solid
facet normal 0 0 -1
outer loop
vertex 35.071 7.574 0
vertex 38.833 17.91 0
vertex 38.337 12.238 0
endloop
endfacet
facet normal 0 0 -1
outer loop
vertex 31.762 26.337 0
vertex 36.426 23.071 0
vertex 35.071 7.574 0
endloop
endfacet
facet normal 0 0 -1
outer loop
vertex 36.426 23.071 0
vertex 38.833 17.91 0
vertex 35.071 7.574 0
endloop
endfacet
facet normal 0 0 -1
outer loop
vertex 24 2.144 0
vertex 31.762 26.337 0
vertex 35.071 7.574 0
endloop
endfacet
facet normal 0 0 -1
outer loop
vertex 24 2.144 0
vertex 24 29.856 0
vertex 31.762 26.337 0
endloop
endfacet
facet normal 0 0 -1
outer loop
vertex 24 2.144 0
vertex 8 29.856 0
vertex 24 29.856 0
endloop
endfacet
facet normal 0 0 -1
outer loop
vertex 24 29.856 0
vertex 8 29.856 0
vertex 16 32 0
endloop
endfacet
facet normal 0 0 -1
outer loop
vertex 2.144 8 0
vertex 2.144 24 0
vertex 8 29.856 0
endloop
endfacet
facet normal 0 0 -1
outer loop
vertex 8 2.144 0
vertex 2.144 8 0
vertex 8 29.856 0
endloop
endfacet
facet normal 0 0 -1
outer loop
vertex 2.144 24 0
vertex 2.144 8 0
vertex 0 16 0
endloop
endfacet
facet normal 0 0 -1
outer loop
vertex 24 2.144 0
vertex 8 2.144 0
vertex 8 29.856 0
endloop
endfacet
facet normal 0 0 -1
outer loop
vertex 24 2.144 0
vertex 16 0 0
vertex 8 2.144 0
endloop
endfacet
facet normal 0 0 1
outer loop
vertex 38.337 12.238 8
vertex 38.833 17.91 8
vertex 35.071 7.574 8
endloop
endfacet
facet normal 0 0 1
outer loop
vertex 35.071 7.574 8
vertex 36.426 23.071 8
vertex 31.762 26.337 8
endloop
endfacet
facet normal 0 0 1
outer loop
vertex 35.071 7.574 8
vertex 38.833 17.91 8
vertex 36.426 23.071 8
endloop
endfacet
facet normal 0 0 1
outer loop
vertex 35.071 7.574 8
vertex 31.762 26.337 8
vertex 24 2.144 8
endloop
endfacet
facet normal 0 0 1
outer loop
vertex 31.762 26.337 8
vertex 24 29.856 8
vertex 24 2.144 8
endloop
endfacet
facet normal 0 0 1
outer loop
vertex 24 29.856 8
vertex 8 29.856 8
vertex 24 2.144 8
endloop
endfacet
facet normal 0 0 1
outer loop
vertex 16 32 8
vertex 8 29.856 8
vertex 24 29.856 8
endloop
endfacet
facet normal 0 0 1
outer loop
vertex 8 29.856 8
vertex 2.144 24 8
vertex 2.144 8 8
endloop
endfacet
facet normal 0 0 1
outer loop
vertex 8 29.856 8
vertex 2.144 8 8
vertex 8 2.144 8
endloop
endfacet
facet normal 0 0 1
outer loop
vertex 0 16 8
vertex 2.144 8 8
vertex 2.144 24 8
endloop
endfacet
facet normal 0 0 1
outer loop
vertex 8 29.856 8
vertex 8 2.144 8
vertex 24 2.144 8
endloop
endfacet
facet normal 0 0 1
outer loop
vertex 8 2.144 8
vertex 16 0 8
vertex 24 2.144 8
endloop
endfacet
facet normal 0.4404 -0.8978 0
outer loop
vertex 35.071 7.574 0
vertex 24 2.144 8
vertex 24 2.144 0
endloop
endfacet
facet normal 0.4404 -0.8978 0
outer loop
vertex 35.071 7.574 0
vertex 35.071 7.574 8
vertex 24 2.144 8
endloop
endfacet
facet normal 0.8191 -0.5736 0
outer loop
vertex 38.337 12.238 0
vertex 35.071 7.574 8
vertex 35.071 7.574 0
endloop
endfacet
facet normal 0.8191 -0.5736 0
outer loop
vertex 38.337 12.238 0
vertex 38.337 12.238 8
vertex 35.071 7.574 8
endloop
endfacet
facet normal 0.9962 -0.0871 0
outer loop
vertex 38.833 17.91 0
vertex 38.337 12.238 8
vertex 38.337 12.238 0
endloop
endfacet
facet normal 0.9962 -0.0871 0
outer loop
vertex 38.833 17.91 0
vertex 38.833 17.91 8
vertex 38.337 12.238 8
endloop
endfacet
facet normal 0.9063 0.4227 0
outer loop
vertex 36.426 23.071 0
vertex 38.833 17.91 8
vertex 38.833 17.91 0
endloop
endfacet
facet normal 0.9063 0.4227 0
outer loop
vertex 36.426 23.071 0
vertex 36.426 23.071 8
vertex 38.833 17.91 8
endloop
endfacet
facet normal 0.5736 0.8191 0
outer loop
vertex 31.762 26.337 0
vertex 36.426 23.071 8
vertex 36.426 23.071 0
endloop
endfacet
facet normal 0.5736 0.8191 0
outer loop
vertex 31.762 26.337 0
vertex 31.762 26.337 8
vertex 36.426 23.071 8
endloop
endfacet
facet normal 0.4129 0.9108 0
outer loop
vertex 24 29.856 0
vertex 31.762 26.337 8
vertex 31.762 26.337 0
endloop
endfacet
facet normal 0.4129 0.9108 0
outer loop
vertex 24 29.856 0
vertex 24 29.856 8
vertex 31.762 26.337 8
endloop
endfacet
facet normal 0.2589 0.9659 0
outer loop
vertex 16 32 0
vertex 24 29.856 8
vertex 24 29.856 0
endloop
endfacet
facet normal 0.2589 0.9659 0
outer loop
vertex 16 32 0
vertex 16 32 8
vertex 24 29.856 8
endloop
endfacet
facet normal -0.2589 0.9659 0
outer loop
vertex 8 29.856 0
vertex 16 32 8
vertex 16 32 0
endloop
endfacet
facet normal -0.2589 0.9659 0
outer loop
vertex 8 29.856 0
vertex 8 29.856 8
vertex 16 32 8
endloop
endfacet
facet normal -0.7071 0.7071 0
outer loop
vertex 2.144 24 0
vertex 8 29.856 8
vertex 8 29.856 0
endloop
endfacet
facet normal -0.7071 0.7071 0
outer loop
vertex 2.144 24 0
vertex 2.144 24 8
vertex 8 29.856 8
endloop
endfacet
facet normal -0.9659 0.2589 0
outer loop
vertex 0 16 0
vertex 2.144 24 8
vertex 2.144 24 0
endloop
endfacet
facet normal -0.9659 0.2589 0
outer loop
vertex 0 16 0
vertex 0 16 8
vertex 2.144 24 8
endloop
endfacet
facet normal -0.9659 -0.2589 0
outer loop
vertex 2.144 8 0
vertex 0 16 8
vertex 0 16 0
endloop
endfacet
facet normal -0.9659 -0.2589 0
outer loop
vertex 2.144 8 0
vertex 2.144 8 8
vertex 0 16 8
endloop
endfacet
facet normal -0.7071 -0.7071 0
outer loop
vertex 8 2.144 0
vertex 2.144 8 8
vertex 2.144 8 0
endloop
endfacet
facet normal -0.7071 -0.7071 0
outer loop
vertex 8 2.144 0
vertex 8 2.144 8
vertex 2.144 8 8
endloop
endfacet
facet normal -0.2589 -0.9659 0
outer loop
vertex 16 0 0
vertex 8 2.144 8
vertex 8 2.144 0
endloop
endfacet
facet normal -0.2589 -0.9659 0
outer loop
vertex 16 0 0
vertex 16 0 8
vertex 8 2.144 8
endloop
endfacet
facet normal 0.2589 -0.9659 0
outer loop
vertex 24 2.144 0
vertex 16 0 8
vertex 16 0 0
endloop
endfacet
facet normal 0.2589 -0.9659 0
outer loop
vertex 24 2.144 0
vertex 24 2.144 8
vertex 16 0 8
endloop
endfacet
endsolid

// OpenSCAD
$fn = 32;

// ----------------------------------------------------------------------
// Eccentric disc: step, 8 mm thick
// ----------------------------------------------------------------------

// --- parameters (mm) ---
profile_height = 8;       // extrusion height
profile_points = 14;      // points of the closed outline

profile = [[0, 16], [2.144, 8], [8, 2.144], [16, 0], [24, 2.144], [35.071, 7.574], [38.337, 12.238], [38.833, 17.91], [36.426, 23.071], [31.762, 26.337], [24, 29.856], [16, 32], [8, 29.856], [2.144, 24]];  // single closed polygon, 14 points, counter clockwise

// --- the one profile operation ---
linear_extrude(height = profile_height) polygon(points = profile);
